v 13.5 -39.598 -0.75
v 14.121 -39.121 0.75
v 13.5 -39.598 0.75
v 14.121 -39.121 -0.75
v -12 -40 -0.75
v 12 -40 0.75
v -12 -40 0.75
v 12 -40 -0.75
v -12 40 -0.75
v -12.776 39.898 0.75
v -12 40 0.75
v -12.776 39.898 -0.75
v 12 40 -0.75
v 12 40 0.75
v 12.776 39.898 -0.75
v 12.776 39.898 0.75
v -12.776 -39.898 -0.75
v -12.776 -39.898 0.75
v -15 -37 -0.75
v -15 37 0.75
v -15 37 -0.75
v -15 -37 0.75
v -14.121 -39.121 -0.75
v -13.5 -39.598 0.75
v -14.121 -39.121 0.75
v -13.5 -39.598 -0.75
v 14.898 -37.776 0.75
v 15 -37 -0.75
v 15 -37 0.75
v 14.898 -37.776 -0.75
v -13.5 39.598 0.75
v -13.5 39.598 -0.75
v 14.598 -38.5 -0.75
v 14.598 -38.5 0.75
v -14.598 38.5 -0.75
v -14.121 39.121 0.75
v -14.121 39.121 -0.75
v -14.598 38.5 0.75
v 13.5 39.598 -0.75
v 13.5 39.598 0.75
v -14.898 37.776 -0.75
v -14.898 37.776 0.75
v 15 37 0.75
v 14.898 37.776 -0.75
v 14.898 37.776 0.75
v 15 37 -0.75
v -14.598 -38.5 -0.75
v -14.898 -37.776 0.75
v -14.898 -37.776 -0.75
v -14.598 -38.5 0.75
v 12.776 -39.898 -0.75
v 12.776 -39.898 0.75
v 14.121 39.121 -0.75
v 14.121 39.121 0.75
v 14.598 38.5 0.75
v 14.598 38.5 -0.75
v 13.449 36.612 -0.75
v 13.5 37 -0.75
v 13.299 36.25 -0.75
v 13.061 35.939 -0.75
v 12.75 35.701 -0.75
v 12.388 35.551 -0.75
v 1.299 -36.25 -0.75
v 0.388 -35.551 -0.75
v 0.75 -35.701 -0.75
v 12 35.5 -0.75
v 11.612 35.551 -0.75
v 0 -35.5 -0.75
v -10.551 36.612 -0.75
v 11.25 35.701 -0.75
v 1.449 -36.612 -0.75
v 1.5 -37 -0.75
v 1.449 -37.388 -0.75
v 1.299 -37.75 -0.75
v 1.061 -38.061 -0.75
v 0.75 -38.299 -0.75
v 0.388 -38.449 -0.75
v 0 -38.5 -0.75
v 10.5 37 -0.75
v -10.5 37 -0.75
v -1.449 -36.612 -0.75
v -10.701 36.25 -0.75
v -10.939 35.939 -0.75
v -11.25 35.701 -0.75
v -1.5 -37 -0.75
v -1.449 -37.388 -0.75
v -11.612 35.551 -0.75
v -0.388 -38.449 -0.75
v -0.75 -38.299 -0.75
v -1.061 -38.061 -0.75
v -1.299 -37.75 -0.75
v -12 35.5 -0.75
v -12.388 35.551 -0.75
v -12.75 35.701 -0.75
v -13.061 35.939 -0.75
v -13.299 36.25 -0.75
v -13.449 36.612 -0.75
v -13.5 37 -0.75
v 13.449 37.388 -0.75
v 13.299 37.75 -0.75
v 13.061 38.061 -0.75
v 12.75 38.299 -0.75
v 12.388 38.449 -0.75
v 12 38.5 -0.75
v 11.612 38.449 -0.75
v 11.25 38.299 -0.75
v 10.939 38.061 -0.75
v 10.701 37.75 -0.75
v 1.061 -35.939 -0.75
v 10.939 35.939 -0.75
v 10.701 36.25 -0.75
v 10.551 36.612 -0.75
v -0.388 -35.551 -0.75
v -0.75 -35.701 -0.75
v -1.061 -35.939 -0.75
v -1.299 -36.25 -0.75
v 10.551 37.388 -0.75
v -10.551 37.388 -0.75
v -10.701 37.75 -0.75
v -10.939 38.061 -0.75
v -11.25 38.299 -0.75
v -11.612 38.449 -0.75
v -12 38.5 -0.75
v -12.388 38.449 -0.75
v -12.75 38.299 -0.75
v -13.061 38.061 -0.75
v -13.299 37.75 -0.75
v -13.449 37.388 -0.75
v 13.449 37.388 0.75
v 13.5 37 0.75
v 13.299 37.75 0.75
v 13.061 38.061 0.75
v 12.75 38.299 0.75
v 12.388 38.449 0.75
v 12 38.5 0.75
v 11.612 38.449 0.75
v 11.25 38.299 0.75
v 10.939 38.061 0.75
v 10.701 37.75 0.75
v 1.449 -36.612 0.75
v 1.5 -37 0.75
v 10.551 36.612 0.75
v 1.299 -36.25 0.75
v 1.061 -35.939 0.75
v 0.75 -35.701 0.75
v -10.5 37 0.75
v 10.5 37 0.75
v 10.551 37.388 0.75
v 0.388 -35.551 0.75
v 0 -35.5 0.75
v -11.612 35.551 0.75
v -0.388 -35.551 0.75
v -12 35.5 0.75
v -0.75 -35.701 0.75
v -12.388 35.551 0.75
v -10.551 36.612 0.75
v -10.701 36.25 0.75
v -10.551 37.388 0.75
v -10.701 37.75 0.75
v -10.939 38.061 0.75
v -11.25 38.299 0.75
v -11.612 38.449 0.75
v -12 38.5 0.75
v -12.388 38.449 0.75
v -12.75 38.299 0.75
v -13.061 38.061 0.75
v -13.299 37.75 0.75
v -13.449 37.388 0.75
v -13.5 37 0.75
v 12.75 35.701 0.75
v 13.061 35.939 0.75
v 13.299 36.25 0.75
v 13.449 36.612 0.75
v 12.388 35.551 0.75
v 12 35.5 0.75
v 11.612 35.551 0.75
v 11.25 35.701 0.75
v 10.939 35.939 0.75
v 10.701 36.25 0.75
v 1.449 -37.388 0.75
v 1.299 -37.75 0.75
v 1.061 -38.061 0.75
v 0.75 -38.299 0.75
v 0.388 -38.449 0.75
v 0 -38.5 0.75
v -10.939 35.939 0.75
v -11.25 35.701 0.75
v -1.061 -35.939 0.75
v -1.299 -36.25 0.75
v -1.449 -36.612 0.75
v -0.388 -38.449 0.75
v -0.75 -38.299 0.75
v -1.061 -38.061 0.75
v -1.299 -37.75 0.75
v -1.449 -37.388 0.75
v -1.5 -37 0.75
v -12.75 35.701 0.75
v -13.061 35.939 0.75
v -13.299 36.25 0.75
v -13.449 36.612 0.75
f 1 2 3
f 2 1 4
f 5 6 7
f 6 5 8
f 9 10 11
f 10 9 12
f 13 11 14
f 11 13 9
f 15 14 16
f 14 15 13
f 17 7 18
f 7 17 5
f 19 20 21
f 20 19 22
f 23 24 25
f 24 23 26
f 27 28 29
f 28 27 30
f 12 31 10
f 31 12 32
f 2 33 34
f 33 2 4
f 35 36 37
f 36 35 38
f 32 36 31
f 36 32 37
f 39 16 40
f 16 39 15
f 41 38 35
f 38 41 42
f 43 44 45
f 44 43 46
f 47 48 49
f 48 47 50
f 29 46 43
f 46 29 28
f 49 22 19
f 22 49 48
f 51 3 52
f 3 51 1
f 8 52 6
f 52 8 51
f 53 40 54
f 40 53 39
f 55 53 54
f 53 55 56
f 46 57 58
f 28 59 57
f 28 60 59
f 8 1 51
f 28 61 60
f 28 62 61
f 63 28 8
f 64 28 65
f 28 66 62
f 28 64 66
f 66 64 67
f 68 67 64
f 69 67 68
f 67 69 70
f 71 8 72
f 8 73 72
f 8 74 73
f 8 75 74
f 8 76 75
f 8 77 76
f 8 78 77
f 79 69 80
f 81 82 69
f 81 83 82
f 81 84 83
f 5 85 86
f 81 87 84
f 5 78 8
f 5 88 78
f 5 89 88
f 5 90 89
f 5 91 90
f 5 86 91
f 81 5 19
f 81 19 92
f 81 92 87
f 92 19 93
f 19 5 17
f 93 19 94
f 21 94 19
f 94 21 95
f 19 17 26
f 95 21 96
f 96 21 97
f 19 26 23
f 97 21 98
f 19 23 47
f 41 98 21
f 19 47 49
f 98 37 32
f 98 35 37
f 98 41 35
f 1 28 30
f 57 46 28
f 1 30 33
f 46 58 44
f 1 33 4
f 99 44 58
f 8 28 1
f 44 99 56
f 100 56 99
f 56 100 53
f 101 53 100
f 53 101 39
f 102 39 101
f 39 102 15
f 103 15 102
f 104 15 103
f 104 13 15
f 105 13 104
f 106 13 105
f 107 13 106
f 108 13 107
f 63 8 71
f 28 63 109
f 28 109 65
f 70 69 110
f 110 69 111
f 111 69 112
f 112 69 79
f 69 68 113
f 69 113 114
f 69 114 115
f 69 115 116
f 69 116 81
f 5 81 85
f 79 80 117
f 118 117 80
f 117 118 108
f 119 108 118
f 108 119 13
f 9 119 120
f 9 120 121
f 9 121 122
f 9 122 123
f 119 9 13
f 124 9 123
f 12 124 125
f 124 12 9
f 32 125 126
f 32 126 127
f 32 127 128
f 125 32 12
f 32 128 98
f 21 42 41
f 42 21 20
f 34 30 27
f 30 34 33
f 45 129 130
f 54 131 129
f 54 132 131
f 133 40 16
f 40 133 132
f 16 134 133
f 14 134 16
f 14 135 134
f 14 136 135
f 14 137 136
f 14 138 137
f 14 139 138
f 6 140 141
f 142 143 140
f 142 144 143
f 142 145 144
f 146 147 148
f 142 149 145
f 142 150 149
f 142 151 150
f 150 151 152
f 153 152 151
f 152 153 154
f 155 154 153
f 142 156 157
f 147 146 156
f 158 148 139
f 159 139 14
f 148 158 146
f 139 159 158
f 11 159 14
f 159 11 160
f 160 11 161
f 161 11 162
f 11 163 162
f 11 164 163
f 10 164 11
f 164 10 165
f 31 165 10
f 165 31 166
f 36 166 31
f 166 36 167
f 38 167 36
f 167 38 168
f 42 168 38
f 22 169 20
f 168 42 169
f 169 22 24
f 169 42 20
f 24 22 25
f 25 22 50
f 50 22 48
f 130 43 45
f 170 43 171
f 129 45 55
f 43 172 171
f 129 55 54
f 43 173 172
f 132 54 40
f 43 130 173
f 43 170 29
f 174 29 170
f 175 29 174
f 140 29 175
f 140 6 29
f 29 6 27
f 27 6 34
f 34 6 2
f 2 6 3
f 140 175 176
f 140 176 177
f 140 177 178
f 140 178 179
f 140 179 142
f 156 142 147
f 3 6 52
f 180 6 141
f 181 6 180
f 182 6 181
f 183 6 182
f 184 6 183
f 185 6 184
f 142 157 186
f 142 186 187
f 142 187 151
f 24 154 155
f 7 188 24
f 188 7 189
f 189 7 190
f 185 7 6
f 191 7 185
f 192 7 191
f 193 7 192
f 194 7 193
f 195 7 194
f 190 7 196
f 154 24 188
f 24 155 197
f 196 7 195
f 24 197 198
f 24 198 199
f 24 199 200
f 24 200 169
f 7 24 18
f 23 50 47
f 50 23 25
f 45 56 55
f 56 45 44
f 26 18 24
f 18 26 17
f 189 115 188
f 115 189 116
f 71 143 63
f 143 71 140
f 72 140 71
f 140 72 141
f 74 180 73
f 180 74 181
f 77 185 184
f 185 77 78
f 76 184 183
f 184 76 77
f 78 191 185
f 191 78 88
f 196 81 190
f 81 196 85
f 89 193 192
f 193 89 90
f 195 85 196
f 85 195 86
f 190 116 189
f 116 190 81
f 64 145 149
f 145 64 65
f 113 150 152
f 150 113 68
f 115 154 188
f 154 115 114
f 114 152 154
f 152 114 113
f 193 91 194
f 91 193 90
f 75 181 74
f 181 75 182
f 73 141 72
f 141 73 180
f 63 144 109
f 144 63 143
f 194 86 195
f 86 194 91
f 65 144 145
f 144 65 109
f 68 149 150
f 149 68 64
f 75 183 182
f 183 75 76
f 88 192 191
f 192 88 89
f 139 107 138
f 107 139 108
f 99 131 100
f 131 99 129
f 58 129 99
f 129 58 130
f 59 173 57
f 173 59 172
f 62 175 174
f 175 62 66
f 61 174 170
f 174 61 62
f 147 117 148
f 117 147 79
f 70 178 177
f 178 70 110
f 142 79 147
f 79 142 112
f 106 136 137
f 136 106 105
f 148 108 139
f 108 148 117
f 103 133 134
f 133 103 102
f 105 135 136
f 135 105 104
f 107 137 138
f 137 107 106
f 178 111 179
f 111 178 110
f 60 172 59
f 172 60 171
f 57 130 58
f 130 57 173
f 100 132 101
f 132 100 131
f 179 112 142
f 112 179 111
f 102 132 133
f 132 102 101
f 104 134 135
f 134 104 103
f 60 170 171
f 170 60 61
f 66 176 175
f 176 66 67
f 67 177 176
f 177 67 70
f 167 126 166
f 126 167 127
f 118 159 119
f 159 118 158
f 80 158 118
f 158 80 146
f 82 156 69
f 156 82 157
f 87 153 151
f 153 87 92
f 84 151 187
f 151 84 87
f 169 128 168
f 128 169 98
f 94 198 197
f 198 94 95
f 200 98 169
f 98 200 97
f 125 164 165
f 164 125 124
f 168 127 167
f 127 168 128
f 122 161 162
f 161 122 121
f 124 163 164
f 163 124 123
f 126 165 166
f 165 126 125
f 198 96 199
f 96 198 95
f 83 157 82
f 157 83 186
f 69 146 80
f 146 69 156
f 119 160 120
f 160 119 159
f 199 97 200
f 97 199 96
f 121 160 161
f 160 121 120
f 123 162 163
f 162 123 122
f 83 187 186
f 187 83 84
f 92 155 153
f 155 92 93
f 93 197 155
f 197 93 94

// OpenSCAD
module board(
	size_x=50,
	size_y=50,
	width=1.5,
	hole_diam=3,
	rounding=1,
	hole1=[3,3],
	hole2=[3,3],
	hole3=[3,3],
	hole4=[3,3],
	center_xy=false,
	center_z=false,
	board_color=[0.3,0.5,0.3],
	quality=2, //integer from 1 to infinity
)
{
	assert(size_x>0);
	assert(size_y>0);
	assert(width>0);
	assert(hole_diam>0);
	assert(rounding>0);
	assert(rounding<=size_x/2);
	assert(rounding<=size_y/2);
	assert(quality>0)

	color(board_color)
		translate([center_xy?-size_x/2:0,center_xy?-size_y/2:0,center_z?-width/2:0])
			difference()
			{
				//base
				translate([rounding,rounding])
					resize([size_x,size_y,width])
						minkowski()
						{
							cube([size_x-rounding*2,size_y-rounding*2,width]);
							cylinder(r=rounding,h=width,$fn=12*quality);
						};
				//holes
				if(hole1!=false && len(hole1)==2)
					translate([hole1[0],hole1[1],-width/2])
						cylinder(r=hole_diam/2,h=width*2,$fn=12*quality);
				if(hole2!=false && len(hole2)==2)
					translate([size_x-hole2[0],hole2[1],-width/2])
						cylinder(r=hole_diam/2,h=width*2,$fn=12*quality);
				if(hole3!=false && len(hole3)==2)
					translate([size_x-hole3[0],size_y-hole3[1],-width/2])
						cylinder(r=hole_diam/2,h=width*2,$fn=12*quality);
				if(hole4!=false && len(hole4)==2)
					translate([hole4[0],size_y-hole4[1],-width/2])
						cylinder(r=hole_diam/2,h=width*2,$fn=12*quality);
			}
}

//example
board(size_x=30,size_y=80,hole1=[15,3],hole2=false,center_xy=true,center_z=true,rounding=3);
